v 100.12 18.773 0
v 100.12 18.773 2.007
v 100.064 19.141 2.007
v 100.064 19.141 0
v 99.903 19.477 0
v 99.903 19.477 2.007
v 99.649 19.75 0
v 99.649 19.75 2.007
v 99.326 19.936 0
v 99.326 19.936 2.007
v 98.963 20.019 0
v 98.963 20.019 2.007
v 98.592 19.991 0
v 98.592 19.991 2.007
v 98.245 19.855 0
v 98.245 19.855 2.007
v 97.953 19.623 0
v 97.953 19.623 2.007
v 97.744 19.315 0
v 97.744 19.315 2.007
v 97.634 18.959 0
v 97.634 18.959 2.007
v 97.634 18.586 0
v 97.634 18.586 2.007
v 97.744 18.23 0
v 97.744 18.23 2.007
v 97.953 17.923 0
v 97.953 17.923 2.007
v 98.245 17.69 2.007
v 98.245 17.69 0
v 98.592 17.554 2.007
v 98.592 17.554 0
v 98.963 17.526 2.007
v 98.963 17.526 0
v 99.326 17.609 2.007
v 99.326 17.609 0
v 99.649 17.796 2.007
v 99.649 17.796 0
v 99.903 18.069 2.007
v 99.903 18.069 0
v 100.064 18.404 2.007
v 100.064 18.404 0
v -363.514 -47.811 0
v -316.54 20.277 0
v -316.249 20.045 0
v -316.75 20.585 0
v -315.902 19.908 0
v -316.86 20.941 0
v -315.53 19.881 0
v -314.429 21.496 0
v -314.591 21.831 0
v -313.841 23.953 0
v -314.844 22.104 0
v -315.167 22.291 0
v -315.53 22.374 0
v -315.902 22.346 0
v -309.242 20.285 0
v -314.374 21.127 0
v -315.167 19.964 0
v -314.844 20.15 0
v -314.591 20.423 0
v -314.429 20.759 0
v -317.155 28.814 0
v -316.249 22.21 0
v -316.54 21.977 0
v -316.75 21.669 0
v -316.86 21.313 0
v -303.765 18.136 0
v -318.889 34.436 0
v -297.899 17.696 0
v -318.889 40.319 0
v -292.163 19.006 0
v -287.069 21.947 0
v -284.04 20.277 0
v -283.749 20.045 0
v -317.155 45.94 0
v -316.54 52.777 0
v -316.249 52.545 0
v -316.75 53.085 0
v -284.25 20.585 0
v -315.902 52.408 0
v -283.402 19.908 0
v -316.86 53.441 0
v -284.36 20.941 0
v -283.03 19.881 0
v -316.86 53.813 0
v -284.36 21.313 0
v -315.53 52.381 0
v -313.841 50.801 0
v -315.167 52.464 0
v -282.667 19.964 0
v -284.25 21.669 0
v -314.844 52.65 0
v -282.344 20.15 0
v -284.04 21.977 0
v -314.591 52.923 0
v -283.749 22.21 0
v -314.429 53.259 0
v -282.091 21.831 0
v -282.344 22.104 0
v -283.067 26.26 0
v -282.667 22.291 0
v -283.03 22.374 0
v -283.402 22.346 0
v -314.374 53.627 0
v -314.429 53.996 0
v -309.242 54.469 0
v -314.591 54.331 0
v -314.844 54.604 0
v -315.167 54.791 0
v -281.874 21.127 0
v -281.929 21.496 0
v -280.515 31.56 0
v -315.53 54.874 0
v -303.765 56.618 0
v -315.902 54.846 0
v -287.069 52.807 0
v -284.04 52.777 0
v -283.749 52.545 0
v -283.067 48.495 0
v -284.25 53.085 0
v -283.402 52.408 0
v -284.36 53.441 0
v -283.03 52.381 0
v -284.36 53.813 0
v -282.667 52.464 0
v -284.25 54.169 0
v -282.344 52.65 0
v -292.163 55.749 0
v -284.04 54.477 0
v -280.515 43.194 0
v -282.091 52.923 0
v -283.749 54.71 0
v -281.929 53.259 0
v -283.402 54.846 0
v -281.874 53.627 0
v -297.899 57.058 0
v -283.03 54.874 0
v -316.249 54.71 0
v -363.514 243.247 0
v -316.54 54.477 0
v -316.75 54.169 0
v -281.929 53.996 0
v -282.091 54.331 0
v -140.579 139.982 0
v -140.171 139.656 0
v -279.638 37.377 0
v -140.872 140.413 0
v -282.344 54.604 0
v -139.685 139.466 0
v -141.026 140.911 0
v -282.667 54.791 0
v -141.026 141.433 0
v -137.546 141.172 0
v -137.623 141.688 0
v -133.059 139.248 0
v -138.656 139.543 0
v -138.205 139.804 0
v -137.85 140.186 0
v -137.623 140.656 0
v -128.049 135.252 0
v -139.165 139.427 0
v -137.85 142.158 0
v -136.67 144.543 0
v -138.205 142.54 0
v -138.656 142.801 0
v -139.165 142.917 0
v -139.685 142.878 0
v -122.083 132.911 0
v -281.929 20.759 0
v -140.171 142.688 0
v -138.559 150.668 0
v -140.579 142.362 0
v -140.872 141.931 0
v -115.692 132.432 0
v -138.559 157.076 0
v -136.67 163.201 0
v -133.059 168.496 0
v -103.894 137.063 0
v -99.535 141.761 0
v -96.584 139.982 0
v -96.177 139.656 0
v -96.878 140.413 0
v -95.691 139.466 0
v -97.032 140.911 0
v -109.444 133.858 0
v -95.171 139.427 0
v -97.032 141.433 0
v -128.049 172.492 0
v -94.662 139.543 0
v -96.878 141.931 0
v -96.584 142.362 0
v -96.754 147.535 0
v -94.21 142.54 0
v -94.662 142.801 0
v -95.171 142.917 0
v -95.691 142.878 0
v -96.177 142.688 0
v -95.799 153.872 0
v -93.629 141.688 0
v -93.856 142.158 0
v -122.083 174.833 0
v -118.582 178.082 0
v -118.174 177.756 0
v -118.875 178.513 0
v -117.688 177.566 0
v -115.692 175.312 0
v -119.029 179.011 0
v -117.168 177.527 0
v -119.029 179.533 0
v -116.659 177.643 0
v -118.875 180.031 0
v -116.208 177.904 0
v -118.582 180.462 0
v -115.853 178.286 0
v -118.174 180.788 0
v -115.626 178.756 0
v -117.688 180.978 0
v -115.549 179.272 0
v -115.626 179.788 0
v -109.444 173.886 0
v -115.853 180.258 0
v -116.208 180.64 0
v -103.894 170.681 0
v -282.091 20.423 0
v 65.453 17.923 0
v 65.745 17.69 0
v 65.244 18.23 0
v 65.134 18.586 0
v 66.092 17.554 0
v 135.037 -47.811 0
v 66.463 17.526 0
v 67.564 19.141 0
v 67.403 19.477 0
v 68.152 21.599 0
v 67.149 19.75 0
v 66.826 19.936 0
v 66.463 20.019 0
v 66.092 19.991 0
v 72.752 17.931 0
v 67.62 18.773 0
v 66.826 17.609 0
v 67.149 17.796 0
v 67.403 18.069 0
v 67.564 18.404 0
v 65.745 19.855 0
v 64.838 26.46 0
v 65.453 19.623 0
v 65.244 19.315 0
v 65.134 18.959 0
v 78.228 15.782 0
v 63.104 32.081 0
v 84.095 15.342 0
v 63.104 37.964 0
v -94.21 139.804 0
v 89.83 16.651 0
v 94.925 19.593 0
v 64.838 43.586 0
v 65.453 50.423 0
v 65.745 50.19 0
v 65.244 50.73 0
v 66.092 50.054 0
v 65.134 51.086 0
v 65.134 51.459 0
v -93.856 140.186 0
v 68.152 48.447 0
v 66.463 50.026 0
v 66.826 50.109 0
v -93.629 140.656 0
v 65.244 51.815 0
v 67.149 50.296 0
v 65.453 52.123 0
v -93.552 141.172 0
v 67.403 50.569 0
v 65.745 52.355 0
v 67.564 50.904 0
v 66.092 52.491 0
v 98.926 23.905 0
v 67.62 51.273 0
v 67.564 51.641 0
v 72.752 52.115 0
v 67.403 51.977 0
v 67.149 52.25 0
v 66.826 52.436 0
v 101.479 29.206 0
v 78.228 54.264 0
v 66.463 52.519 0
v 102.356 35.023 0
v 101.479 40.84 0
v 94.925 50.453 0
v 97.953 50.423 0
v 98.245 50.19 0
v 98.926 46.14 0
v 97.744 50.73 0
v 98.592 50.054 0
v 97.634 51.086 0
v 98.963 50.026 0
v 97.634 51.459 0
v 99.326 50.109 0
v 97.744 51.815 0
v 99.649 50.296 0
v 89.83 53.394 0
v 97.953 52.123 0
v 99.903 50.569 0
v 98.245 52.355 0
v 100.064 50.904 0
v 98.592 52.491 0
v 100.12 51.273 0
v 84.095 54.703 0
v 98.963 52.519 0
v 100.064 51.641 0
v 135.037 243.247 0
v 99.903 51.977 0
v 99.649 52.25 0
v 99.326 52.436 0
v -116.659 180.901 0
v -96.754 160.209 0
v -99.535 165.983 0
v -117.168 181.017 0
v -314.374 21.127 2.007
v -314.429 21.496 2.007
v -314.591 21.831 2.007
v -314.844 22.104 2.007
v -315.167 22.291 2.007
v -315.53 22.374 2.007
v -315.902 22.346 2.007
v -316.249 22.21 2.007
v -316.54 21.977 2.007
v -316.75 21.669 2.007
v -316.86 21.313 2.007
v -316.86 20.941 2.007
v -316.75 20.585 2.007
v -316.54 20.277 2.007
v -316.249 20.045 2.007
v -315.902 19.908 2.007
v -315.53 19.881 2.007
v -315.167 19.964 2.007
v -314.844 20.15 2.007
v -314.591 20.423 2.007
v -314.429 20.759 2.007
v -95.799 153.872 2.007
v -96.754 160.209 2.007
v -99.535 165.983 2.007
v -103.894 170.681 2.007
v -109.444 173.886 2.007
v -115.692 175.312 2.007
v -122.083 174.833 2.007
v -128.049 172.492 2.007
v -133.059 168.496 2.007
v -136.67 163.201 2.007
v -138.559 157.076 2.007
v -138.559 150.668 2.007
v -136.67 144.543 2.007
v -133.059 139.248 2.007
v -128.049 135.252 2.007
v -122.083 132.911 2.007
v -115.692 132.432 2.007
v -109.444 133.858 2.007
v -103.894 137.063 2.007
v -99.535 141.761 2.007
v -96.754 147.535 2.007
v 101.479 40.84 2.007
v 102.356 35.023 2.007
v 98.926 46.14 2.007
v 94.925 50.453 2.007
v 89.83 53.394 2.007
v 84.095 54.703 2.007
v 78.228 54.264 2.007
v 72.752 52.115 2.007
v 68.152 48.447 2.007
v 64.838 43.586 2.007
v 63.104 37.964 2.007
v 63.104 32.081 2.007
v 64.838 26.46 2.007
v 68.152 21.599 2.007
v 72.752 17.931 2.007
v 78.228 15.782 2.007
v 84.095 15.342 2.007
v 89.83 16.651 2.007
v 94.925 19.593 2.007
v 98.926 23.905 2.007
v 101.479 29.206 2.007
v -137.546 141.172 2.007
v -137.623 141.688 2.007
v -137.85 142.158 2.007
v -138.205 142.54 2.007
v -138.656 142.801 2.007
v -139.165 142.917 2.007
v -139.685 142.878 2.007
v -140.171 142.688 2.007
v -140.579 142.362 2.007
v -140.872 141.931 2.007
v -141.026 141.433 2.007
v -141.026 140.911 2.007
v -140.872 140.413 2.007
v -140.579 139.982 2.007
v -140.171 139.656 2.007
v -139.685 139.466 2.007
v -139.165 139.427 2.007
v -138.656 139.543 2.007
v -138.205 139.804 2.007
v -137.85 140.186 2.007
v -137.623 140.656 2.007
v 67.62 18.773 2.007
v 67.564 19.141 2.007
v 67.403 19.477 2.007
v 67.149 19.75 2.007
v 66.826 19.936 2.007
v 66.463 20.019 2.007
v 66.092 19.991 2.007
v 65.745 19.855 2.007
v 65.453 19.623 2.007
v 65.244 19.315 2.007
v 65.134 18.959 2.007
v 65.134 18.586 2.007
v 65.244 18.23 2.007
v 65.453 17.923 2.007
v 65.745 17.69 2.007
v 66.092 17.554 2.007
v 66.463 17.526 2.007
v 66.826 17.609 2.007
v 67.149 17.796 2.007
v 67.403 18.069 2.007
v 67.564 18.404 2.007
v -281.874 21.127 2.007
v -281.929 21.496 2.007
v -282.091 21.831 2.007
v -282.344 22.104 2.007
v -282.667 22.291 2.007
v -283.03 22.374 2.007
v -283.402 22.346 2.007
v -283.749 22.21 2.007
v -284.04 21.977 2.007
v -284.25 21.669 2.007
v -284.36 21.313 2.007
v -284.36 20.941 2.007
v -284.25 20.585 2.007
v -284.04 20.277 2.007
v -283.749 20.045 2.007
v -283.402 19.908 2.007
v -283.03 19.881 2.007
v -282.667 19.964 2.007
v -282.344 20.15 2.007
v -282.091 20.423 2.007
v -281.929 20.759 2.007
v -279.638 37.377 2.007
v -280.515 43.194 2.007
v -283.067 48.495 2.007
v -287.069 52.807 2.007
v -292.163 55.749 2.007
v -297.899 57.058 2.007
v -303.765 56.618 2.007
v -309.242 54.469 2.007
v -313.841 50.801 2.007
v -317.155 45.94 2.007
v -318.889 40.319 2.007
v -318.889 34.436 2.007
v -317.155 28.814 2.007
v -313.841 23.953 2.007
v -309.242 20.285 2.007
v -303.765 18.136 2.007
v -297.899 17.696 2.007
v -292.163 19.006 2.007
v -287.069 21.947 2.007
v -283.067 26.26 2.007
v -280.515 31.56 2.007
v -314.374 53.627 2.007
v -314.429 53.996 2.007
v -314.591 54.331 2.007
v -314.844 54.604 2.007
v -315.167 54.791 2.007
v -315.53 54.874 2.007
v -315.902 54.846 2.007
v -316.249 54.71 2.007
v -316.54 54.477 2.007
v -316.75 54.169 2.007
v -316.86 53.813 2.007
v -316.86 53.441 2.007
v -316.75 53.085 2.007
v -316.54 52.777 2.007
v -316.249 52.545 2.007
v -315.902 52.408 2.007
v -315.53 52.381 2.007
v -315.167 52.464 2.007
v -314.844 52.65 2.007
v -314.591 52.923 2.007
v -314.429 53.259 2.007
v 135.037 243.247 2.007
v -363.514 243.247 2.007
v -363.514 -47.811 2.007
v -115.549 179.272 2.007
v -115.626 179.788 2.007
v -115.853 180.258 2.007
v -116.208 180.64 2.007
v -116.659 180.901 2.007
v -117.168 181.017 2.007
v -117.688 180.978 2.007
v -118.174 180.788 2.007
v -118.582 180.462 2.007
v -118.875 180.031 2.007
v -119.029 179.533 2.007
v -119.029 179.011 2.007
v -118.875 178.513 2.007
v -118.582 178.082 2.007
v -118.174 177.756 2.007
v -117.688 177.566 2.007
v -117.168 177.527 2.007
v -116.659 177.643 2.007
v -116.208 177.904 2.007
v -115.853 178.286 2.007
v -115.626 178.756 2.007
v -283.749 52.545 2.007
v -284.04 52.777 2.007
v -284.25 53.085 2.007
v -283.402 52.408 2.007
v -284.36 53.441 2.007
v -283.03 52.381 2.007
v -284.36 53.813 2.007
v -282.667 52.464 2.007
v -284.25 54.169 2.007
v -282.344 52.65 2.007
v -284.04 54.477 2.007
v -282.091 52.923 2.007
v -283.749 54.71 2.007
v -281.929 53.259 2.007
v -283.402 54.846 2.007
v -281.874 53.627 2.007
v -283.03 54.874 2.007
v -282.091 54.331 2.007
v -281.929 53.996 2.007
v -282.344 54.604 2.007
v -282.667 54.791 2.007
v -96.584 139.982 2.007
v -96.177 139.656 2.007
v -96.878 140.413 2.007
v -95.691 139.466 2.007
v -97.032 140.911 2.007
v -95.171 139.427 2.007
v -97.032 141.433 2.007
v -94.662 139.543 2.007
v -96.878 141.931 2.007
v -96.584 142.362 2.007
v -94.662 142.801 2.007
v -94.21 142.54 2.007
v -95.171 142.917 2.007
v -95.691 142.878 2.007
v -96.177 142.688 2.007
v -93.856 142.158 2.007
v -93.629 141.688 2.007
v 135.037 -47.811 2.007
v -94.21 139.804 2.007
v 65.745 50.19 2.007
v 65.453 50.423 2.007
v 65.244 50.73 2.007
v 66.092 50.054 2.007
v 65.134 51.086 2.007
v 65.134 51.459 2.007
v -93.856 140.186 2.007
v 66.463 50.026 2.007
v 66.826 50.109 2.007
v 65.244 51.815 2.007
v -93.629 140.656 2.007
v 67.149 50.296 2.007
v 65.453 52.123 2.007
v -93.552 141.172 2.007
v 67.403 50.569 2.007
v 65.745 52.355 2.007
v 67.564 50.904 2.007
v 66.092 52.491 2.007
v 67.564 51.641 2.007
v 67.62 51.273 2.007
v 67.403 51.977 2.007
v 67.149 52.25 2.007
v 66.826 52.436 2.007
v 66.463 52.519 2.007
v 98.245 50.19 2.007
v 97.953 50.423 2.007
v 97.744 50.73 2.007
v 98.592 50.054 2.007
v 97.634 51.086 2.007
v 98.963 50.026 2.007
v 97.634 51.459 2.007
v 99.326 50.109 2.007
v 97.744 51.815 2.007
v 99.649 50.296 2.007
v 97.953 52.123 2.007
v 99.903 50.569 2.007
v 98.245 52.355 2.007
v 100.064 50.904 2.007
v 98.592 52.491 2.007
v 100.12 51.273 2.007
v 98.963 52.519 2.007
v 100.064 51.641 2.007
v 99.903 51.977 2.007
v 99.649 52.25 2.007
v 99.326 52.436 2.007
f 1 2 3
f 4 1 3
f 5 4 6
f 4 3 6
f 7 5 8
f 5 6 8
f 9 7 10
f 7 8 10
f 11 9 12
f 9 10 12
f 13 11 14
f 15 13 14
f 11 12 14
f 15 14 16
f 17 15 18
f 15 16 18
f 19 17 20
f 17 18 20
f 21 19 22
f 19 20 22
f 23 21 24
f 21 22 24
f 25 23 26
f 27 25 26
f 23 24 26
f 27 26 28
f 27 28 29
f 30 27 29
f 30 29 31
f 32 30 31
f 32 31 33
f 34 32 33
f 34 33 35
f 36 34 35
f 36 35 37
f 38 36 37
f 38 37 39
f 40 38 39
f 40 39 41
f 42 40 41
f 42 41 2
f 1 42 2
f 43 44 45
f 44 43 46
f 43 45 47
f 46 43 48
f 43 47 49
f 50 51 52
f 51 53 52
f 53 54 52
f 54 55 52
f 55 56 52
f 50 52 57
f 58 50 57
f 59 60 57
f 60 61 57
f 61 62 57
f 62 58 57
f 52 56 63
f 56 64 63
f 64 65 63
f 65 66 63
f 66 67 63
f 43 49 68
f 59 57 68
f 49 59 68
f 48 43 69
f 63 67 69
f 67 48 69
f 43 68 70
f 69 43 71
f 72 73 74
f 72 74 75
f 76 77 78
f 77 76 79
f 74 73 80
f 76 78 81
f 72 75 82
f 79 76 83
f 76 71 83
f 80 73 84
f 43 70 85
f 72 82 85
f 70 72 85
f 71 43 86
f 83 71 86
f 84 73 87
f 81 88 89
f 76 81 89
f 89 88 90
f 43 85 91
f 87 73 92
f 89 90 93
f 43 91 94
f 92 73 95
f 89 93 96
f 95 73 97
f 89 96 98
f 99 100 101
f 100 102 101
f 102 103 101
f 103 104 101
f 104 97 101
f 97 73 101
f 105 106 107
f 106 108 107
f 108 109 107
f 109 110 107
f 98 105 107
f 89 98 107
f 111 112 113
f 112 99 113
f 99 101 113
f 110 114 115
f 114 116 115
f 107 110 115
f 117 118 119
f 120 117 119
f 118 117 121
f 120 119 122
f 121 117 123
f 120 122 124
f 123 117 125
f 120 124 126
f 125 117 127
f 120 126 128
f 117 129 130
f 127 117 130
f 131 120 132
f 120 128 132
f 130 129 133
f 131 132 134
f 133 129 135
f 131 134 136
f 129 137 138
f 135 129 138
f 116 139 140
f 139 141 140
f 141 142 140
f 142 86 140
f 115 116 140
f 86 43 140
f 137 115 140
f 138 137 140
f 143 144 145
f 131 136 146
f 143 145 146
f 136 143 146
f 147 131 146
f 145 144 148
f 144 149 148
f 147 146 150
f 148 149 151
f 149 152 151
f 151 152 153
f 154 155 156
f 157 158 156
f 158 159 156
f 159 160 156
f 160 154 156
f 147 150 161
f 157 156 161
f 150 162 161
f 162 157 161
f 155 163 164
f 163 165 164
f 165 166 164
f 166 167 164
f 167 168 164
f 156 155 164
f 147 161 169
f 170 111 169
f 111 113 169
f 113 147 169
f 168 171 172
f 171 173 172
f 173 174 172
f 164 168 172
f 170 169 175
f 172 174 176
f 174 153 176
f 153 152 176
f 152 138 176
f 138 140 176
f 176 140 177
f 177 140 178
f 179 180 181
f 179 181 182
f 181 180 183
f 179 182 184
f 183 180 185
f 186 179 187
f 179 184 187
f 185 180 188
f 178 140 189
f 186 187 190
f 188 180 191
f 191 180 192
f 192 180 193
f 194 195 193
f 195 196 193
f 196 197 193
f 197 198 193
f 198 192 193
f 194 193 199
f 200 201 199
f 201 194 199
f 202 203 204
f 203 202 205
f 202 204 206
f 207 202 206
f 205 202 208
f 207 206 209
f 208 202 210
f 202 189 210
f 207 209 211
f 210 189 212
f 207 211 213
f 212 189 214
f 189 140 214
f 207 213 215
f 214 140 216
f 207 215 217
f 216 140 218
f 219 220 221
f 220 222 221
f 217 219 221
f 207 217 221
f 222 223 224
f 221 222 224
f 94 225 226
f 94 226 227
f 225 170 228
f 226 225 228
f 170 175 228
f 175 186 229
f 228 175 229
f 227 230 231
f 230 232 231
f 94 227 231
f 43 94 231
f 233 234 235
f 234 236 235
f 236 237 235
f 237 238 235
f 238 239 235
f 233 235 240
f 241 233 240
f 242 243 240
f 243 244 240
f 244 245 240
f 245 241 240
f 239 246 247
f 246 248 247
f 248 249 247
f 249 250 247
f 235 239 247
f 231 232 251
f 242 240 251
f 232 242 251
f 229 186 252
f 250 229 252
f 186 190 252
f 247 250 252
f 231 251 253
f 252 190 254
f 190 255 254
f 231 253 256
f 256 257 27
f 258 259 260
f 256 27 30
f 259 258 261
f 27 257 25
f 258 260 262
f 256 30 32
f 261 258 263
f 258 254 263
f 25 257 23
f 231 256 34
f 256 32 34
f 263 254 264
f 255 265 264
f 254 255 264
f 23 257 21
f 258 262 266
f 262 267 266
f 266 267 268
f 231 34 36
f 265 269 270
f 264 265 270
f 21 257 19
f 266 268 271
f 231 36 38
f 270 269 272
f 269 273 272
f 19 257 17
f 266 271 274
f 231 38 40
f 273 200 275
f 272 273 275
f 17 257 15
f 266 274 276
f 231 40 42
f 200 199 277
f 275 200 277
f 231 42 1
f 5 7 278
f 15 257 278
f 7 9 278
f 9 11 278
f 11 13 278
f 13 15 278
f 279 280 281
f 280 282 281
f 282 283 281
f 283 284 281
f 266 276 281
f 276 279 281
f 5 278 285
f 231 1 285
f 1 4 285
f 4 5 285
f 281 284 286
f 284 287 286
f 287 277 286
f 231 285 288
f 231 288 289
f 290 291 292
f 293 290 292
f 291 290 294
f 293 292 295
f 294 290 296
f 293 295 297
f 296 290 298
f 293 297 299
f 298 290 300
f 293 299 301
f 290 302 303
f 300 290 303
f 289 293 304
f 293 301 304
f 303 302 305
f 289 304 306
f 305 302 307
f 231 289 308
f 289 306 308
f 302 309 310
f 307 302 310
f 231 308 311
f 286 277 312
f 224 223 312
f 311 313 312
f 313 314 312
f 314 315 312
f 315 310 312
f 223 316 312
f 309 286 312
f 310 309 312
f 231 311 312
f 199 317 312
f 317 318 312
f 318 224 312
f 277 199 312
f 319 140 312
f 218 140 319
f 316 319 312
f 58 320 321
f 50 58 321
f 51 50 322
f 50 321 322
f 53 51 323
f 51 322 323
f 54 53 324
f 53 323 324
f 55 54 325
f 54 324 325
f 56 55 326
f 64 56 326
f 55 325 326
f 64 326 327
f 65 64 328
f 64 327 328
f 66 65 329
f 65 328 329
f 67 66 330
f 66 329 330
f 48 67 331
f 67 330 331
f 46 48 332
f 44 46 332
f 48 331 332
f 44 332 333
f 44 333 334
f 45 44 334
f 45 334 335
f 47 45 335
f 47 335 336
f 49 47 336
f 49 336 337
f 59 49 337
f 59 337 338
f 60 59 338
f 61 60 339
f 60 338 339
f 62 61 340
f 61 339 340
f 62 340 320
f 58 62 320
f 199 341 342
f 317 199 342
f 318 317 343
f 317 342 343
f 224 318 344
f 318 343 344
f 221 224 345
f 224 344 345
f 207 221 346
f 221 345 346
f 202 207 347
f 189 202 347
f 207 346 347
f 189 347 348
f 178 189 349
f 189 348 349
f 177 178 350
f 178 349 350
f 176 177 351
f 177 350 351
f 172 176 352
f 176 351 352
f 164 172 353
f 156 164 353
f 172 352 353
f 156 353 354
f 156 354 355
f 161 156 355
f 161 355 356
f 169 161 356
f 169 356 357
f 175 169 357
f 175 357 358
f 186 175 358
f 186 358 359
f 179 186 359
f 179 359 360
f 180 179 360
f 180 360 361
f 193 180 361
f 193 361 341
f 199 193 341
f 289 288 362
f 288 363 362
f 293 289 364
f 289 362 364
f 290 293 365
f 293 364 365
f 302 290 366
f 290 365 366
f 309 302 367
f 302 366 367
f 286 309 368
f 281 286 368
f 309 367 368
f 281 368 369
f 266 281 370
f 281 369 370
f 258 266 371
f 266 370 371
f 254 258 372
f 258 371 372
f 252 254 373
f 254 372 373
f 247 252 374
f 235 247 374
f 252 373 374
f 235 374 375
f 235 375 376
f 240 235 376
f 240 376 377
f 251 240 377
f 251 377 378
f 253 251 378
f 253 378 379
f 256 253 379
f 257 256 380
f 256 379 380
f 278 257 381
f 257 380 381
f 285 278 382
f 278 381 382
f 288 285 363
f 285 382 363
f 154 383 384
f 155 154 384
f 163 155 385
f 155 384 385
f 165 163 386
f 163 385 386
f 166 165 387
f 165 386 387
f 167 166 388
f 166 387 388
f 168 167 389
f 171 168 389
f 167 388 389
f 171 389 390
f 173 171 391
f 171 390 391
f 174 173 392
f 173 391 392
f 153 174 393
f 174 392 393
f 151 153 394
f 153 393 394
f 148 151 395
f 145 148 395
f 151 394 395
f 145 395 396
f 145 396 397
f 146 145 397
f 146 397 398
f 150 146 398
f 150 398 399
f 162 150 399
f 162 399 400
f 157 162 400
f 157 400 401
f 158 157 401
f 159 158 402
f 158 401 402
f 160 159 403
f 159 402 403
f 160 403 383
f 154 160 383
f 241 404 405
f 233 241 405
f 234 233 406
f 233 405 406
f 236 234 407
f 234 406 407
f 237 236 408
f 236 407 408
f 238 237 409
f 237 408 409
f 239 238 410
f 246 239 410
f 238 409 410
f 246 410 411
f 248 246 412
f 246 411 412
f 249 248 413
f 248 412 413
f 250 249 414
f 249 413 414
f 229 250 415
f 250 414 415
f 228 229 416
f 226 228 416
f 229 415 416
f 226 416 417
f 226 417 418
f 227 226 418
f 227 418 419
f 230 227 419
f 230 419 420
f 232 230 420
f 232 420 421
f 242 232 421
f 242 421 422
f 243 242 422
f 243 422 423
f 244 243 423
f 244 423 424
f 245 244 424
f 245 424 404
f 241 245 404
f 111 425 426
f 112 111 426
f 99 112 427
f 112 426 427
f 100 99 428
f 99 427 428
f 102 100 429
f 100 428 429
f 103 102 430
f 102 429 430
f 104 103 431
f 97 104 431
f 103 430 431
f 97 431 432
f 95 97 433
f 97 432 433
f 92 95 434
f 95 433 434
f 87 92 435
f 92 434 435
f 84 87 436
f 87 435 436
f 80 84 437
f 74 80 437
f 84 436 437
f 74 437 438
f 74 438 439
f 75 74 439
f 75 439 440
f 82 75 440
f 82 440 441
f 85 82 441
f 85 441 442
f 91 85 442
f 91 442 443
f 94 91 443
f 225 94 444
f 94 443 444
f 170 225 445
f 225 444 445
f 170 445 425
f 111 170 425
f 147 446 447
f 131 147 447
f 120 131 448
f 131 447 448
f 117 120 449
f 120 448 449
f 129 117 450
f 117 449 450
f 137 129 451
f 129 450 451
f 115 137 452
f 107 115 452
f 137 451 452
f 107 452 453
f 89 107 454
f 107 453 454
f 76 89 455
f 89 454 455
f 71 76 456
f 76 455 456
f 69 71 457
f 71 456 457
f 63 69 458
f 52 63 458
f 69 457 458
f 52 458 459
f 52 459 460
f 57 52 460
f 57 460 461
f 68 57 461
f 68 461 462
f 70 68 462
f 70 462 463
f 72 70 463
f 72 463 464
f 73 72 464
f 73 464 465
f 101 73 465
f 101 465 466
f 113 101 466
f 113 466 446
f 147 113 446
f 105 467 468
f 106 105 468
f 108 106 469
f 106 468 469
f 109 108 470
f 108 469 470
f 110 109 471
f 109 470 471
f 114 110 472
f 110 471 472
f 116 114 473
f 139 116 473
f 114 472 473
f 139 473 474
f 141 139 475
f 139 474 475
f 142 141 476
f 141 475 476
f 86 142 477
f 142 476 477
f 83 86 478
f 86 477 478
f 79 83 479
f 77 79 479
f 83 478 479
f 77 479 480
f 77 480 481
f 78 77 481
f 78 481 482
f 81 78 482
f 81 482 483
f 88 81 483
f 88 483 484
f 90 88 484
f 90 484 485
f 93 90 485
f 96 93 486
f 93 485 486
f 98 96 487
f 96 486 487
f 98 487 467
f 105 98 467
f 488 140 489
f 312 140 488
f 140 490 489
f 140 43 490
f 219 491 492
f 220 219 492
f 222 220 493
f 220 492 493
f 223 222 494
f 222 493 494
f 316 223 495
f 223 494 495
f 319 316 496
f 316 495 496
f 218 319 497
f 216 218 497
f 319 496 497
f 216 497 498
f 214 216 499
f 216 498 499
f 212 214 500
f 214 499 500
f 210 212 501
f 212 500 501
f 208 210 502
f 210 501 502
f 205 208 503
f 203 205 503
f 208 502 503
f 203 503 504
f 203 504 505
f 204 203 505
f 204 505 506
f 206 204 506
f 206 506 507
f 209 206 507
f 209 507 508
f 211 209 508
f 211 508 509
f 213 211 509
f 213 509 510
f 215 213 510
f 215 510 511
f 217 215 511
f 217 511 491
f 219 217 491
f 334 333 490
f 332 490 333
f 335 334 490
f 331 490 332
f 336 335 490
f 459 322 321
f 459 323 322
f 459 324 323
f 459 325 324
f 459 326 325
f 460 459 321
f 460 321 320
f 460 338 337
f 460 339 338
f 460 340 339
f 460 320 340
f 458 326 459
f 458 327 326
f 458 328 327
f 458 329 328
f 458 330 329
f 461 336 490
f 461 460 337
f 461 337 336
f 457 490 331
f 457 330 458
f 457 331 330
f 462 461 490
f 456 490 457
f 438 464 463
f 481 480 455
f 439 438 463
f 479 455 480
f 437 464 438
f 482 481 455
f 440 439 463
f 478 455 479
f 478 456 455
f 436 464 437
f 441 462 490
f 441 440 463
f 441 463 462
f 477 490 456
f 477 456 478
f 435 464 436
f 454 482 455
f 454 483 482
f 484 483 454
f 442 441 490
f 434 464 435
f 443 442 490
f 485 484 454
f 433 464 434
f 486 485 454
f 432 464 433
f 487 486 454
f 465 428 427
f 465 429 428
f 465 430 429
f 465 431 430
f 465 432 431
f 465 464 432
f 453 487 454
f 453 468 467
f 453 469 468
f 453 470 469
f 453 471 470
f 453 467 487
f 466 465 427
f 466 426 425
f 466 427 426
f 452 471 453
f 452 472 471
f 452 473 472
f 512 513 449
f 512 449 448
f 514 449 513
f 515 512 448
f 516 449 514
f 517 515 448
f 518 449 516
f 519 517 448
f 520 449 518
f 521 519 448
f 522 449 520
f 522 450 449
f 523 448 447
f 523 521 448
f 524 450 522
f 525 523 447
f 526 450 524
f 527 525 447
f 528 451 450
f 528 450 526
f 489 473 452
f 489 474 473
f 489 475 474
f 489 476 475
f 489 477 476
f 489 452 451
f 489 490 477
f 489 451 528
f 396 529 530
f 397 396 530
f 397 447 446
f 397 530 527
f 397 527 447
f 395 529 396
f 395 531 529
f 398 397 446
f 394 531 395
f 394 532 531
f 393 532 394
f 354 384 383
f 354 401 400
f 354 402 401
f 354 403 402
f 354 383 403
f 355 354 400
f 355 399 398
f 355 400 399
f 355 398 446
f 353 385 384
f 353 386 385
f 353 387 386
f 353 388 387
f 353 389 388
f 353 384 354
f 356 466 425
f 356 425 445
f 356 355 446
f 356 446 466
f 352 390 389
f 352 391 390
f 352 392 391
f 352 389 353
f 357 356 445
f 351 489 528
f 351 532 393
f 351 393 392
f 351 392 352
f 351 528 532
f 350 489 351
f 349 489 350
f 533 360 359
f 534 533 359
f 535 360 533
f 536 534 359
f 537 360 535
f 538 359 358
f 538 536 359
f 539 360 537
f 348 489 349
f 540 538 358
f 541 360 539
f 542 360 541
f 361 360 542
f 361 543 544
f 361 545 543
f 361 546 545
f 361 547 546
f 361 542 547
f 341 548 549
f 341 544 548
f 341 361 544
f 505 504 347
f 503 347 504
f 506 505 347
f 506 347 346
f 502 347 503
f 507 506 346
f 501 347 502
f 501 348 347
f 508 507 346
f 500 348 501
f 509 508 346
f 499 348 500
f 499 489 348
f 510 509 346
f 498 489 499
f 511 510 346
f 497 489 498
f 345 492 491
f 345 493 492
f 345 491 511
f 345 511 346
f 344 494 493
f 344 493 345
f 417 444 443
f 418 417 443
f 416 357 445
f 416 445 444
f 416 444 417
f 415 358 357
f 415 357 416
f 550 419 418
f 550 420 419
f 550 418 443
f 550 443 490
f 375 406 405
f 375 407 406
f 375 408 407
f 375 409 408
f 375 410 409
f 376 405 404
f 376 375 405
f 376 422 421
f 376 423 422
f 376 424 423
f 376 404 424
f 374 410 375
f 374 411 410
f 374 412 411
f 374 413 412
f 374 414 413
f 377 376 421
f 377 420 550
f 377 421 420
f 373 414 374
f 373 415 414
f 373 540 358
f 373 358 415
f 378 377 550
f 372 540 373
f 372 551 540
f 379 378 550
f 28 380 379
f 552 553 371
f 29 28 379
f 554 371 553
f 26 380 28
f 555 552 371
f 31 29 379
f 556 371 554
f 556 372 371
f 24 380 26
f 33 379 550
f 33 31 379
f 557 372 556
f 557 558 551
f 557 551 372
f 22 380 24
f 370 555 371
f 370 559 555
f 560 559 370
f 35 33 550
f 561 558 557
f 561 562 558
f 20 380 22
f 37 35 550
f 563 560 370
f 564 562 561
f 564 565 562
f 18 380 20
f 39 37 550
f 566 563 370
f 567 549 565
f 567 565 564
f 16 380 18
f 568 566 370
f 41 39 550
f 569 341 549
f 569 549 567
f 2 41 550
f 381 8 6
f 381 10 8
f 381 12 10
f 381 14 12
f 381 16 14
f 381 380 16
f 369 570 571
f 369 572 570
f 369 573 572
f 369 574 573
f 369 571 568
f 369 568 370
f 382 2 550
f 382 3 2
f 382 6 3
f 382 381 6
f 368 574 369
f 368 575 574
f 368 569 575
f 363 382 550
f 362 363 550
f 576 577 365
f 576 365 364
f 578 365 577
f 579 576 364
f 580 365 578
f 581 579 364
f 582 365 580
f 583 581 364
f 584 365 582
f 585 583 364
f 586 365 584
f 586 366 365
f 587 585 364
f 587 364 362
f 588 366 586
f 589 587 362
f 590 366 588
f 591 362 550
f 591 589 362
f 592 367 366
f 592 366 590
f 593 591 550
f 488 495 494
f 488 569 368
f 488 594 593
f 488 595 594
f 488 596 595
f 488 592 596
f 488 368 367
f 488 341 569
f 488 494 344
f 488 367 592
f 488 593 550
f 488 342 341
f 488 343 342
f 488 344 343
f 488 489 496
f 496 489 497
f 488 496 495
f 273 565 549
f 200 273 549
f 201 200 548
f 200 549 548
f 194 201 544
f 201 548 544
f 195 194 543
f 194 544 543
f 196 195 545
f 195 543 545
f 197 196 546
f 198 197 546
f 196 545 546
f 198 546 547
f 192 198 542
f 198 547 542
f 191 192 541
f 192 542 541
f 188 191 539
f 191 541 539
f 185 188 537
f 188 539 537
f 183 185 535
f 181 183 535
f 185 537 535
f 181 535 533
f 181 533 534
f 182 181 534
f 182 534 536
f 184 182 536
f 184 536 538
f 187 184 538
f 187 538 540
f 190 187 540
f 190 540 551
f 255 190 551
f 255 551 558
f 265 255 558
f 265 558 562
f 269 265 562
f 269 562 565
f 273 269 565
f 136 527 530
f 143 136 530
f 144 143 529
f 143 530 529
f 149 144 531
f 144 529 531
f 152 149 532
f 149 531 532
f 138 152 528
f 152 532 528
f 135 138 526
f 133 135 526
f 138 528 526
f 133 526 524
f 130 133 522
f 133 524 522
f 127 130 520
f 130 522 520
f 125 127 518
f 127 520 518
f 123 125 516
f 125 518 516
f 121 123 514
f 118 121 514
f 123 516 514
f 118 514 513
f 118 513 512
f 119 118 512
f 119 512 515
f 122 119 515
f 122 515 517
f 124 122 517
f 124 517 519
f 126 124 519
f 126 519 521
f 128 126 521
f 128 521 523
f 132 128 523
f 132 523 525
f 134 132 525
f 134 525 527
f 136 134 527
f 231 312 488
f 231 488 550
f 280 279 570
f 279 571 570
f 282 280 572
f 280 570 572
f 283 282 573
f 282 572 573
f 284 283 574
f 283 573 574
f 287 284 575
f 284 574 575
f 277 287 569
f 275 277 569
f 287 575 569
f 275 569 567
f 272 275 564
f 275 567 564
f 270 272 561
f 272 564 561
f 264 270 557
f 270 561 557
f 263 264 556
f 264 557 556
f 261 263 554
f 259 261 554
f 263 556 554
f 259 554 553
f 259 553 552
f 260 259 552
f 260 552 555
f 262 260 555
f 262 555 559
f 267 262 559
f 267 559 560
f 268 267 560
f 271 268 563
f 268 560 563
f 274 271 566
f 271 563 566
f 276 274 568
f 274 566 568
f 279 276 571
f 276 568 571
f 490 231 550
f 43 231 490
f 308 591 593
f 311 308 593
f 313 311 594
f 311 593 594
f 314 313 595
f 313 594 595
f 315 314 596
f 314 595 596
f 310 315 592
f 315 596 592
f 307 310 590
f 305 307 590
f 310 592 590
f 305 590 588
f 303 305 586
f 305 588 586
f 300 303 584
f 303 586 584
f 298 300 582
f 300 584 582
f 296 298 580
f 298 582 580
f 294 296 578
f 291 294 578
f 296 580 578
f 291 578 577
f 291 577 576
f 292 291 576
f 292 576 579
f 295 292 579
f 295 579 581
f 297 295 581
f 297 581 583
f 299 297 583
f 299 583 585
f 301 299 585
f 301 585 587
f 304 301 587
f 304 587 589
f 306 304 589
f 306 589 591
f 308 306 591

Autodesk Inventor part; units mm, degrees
ref_plane "YZ Plane" through (0, 0, 0) normal (1, 0, 0) x (0, 1, 0)
ref_plane "XZ Plane" through (0, 0, 0) normal (0, 1, 0) x (-1, 0, 0)
ref_plane "XY Plane" through (0, 0, 0) normal (0, 0, 1) x (1, 0, 0)
sketch "Sketch1" plane through (0, 0, 0) normal (0, 0, 1) x (1, 0, 0)
  line L0 (-363.5144, 243.2472) -> (135.0368, 243.2472)
  line L1 (135.0368, 243.2472) -> (135.0368, -47.8114)
  line L2 (135.0368, -47.8114) -> (-363.5144, -47.8114)
  line L3 (-363.5144, -47.8114) -> (-363.5144, 243.2472)
  point P0 (0, 0)
  dimension "d0" = 498.5512
  dimension "d1" = 291.0586
extrude "Extrusion1" add sketch "Sketch1" along normal blind 2.0066
sketch "Sketch2" plane through (0, 0, 2.0066) normal (0, 0, 1) x (1, 0, 0)
  circle A0 centre (82.6198, 35.0228) radius 19.7358
  circle A1 centre (66.3698, 18.7728) radius 1.25
  line L0 (385.8263, -153.0596) -> (385.8263, 254.4224)
  line L1 (-77.3983, -47.0364) -> (620.5734, -47.0364)
  circle A2 centre (66.3698, 51.2728) radius 1.25
  circle A3 centre (98.8698, 18.7728) radius 1.25
  circle A4 centre (98.8698, 51.2728) radius 1.25
  point P0 (385.8263, -47.0364)
  dimension "d4" = 39.4716
  dimension "d5" = 2.5
  dimension "d11" = 32.5
  dimension "d14" = 32.5
  dimension "d17" = 16.25
  dimension "d18" = 16.25
extrude "Joystick 1" cut sketch "Sketch2" against normal blind 2.0066
sketch "Sketch3" plane through (1.6331, 0.1353, 2.0066) normal (0, 0, 1) x (1, 0, 0)
  circle A0 centre (-301.0067, 37.2418) radius 19.7358
  circle A1 centre (-317.2567, 20.9918) radius 1.25
  line L0 (0, -106.0232) -> (0, 301.4589)
  line L1 (-463.2246, 0) -> (234.7471, 0)
  circle A2 centre (-317.2567, 53.4918) radius 1.25
  circle A3 centre (-284.7567, 20.9918) radius 1.25
  circle A4 centre (-284.7567, 53.4918) radius 1.25
  point P0 (0, 0)
  dimension "d30" = 39.4716
  dimension "d28" = 2.5
  dimension "d22" = 32.5
  dimension "d21" = 32.5
  dimension "d27" = 16.25
  dimension "d29" = 16.25
extrude "Joystick 2" cut sketch "Sketch3" against normal blind 2.0066
sketch "Sketch4" plane through (0, 0, 2.0066) normal (0, 0, 1) x (1, 0, 0)
  circle A0 centre (-117.2987, 153.872) radius 21.5
  circle A1 centre (-117.2987, 179.272) radius 1.75
  circle A2 centre (-139.2957, 141.172) radius 1.75
  circle A3 centre (-95.3016, 141.172) radius 1.75
  point P0 (0, 0)
  dimension "d34" = 43
  dimension "d35" = 25.4
  dimension "d36" = 3.5
  dimension "d39" = 360
extrude "Throttle Encoder" cut sketch "Sketch4" against normal blind 2.0066
properties part number "Panel"
